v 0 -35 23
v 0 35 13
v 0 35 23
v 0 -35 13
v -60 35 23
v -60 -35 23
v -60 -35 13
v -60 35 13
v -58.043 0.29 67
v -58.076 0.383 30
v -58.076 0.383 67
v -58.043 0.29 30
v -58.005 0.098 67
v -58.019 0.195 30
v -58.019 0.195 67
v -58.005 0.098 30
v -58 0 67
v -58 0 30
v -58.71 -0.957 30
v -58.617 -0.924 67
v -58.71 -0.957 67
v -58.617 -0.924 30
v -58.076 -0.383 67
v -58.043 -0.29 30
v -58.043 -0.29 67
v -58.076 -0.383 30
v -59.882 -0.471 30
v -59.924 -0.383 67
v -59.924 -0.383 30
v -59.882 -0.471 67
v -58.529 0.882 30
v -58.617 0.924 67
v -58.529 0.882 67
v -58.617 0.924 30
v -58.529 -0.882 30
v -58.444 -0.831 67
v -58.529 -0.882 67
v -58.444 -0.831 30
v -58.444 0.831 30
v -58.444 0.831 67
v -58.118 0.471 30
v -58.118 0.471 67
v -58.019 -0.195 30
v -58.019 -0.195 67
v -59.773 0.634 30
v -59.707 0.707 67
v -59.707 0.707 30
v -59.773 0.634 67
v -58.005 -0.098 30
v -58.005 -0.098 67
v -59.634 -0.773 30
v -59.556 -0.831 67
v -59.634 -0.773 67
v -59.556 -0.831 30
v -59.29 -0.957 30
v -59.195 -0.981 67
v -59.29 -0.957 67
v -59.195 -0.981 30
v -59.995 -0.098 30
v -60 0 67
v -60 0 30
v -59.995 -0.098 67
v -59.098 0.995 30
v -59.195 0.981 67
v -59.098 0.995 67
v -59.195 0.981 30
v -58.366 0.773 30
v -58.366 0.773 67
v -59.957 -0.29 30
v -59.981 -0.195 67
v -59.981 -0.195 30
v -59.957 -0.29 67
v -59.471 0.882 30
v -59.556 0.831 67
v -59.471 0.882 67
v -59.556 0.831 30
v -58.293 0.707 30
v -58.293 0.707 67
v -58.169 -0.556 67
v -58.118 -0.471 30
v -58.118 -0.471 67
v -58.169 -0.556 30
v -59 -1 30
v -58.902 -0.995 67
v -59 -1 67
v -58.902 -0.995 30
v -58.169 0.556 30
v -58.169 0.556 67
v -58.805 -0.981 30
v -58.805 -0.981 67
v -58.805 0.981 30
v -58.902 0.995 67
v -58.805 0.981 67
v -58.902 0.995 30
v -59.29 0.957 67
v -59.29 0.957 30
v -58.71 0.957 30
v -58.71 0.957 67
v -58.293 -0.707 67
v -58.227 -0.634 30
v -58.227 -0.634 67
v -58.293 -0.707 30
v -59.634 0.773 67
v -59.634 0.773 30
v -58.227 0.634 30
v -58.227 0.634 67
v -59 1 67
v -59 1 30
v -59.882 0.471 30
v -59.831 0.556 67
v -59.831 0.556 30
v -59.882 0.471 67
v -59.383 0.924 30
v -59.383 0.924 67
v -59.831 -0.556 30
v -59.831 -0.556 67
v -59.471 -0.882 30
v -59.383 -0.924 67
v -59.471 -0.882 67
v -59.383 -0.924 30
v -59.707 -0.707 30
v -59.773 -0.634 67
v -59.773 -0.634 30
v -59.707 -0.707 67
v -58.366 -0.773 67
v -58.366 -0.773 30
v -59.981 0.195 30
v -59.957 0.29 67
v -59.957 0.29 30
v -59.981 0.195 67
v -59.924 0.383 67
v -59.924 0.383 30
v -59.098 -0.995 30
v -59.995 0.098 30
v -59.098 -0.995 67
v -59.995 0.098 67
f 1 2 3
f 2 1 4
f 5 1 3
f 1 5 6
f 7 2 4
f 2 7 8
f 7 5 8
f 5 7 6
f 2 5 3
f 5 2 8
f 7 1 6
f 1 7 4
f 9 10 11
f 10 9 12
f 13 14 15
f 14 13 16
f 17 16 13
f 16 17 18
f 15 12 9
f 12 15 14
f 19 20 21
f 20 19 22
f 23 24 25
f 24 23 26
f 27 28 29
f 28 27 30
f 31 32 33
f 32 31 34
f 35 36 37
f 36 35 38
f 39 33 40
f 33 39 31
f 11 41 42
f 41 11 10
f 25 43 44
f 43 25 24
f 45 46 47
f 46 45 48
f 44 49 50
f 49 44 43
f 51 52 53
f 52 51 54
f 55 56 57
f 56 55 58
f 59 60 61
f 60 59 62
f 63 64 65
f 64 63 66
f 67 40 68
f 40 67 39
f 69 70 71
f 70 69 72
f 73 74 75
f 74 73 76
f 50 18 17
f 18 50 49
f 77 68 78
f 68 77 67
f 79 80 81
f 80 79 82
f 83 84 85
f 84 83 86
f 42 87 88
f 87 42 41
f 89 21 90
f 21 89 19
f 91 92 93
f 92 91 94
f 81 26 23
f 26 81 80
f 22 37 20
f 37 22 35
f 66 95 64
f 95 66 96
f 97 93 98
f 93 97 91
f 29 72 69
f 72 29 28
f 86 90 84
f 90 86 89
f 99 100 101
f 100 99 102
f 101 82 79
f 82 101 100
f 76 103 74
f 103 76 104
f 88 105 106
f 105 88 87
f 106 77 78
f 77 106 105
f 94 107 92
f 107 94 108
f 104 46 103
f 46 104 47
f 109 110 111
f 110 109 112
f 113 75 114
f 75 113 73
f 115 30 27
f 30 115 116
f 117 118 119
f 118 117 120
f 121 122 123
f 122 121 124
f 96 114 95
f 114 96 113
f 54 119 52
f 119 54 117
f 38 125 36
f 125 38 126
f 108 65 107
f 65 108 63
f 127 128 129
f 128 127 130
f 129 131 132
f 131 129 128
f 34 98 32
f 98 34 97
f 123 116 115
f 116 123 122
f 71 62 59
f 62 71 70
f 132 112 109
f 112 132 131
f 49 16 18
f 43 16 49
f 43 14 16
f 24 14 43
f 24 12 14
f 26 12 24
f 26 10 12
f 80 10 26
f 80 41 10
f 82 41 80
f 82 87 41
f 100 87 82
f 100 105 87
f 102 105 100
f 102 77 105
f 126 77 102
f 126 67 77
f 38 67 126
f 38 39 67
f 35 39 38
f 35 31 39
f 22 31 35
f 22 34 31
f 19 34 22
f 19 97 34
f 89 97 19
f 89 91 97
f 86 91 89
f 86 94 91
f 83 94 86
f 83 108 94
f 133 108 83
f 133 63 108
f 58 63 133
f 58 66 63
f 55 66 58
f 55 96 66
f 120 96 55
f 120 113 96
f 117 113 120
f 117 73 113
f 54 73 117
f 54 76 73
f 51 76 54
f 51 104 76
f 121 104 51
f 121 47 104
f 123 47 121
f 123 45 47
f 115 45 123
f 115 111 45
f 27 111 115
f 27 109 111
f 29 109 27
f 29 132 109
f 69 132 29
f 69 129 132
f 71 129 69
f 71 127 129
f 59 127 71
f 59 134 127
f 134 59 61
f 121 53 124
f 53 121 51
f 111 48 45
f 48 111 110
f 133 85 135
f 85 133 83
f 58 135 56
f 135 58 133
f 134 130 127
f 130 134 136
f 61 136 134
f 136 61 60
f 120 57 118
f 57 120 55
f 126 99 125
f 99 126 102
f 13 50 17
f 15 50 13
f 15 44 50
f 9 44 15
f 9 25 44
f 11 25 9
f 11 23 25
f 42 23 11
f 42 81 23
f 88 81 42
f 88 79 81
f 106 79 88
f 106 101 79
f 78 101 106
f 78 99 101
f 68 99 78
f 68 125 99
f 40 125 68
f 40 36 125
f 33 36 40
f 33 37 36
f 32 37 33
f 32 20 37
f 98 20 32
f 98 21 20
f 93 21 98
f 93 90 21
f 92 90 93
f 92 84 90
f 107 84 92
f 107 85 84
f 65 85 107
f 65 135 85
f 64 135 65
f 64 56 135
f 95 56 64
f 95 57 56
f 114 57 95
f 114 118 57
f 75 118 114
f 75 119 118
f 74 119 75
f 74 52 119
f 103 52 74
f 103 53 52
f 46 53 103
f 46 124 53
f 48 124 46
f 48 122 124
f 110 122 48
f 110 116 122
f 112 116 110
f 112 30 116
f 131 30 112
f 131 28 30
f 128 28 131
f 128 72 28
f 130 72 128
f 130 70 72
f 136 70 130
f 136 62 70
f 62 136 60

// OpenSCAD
// Built by bench/smallmodels/features/compiler.py from a list of features.
$fn = 64;
difference() {
  union() {
    translate([0, 0, 0]) translate([-60, -35, 0]) cube([120, 70, 40]);
  }
  union() {
    translate([0, 0, 3]) rotate([0, 0, 0]) translate([-60, -35, 0]) cube([120, 70, 37]);
    translate([0, 0, -3]) rotate([0, 0, 0]) translate([-60, -35, 0]) cube([120, 70, 40]);
  }
}
union() {
    translate([-30, 0, 13]) translate([-30, -35, 0]) cube([60, 70, 10]);
  }
union() {
    translate([-59, 0, 30]) rotate([0, 0, 0]) cylinder(d = 2, h = 37);
  }
